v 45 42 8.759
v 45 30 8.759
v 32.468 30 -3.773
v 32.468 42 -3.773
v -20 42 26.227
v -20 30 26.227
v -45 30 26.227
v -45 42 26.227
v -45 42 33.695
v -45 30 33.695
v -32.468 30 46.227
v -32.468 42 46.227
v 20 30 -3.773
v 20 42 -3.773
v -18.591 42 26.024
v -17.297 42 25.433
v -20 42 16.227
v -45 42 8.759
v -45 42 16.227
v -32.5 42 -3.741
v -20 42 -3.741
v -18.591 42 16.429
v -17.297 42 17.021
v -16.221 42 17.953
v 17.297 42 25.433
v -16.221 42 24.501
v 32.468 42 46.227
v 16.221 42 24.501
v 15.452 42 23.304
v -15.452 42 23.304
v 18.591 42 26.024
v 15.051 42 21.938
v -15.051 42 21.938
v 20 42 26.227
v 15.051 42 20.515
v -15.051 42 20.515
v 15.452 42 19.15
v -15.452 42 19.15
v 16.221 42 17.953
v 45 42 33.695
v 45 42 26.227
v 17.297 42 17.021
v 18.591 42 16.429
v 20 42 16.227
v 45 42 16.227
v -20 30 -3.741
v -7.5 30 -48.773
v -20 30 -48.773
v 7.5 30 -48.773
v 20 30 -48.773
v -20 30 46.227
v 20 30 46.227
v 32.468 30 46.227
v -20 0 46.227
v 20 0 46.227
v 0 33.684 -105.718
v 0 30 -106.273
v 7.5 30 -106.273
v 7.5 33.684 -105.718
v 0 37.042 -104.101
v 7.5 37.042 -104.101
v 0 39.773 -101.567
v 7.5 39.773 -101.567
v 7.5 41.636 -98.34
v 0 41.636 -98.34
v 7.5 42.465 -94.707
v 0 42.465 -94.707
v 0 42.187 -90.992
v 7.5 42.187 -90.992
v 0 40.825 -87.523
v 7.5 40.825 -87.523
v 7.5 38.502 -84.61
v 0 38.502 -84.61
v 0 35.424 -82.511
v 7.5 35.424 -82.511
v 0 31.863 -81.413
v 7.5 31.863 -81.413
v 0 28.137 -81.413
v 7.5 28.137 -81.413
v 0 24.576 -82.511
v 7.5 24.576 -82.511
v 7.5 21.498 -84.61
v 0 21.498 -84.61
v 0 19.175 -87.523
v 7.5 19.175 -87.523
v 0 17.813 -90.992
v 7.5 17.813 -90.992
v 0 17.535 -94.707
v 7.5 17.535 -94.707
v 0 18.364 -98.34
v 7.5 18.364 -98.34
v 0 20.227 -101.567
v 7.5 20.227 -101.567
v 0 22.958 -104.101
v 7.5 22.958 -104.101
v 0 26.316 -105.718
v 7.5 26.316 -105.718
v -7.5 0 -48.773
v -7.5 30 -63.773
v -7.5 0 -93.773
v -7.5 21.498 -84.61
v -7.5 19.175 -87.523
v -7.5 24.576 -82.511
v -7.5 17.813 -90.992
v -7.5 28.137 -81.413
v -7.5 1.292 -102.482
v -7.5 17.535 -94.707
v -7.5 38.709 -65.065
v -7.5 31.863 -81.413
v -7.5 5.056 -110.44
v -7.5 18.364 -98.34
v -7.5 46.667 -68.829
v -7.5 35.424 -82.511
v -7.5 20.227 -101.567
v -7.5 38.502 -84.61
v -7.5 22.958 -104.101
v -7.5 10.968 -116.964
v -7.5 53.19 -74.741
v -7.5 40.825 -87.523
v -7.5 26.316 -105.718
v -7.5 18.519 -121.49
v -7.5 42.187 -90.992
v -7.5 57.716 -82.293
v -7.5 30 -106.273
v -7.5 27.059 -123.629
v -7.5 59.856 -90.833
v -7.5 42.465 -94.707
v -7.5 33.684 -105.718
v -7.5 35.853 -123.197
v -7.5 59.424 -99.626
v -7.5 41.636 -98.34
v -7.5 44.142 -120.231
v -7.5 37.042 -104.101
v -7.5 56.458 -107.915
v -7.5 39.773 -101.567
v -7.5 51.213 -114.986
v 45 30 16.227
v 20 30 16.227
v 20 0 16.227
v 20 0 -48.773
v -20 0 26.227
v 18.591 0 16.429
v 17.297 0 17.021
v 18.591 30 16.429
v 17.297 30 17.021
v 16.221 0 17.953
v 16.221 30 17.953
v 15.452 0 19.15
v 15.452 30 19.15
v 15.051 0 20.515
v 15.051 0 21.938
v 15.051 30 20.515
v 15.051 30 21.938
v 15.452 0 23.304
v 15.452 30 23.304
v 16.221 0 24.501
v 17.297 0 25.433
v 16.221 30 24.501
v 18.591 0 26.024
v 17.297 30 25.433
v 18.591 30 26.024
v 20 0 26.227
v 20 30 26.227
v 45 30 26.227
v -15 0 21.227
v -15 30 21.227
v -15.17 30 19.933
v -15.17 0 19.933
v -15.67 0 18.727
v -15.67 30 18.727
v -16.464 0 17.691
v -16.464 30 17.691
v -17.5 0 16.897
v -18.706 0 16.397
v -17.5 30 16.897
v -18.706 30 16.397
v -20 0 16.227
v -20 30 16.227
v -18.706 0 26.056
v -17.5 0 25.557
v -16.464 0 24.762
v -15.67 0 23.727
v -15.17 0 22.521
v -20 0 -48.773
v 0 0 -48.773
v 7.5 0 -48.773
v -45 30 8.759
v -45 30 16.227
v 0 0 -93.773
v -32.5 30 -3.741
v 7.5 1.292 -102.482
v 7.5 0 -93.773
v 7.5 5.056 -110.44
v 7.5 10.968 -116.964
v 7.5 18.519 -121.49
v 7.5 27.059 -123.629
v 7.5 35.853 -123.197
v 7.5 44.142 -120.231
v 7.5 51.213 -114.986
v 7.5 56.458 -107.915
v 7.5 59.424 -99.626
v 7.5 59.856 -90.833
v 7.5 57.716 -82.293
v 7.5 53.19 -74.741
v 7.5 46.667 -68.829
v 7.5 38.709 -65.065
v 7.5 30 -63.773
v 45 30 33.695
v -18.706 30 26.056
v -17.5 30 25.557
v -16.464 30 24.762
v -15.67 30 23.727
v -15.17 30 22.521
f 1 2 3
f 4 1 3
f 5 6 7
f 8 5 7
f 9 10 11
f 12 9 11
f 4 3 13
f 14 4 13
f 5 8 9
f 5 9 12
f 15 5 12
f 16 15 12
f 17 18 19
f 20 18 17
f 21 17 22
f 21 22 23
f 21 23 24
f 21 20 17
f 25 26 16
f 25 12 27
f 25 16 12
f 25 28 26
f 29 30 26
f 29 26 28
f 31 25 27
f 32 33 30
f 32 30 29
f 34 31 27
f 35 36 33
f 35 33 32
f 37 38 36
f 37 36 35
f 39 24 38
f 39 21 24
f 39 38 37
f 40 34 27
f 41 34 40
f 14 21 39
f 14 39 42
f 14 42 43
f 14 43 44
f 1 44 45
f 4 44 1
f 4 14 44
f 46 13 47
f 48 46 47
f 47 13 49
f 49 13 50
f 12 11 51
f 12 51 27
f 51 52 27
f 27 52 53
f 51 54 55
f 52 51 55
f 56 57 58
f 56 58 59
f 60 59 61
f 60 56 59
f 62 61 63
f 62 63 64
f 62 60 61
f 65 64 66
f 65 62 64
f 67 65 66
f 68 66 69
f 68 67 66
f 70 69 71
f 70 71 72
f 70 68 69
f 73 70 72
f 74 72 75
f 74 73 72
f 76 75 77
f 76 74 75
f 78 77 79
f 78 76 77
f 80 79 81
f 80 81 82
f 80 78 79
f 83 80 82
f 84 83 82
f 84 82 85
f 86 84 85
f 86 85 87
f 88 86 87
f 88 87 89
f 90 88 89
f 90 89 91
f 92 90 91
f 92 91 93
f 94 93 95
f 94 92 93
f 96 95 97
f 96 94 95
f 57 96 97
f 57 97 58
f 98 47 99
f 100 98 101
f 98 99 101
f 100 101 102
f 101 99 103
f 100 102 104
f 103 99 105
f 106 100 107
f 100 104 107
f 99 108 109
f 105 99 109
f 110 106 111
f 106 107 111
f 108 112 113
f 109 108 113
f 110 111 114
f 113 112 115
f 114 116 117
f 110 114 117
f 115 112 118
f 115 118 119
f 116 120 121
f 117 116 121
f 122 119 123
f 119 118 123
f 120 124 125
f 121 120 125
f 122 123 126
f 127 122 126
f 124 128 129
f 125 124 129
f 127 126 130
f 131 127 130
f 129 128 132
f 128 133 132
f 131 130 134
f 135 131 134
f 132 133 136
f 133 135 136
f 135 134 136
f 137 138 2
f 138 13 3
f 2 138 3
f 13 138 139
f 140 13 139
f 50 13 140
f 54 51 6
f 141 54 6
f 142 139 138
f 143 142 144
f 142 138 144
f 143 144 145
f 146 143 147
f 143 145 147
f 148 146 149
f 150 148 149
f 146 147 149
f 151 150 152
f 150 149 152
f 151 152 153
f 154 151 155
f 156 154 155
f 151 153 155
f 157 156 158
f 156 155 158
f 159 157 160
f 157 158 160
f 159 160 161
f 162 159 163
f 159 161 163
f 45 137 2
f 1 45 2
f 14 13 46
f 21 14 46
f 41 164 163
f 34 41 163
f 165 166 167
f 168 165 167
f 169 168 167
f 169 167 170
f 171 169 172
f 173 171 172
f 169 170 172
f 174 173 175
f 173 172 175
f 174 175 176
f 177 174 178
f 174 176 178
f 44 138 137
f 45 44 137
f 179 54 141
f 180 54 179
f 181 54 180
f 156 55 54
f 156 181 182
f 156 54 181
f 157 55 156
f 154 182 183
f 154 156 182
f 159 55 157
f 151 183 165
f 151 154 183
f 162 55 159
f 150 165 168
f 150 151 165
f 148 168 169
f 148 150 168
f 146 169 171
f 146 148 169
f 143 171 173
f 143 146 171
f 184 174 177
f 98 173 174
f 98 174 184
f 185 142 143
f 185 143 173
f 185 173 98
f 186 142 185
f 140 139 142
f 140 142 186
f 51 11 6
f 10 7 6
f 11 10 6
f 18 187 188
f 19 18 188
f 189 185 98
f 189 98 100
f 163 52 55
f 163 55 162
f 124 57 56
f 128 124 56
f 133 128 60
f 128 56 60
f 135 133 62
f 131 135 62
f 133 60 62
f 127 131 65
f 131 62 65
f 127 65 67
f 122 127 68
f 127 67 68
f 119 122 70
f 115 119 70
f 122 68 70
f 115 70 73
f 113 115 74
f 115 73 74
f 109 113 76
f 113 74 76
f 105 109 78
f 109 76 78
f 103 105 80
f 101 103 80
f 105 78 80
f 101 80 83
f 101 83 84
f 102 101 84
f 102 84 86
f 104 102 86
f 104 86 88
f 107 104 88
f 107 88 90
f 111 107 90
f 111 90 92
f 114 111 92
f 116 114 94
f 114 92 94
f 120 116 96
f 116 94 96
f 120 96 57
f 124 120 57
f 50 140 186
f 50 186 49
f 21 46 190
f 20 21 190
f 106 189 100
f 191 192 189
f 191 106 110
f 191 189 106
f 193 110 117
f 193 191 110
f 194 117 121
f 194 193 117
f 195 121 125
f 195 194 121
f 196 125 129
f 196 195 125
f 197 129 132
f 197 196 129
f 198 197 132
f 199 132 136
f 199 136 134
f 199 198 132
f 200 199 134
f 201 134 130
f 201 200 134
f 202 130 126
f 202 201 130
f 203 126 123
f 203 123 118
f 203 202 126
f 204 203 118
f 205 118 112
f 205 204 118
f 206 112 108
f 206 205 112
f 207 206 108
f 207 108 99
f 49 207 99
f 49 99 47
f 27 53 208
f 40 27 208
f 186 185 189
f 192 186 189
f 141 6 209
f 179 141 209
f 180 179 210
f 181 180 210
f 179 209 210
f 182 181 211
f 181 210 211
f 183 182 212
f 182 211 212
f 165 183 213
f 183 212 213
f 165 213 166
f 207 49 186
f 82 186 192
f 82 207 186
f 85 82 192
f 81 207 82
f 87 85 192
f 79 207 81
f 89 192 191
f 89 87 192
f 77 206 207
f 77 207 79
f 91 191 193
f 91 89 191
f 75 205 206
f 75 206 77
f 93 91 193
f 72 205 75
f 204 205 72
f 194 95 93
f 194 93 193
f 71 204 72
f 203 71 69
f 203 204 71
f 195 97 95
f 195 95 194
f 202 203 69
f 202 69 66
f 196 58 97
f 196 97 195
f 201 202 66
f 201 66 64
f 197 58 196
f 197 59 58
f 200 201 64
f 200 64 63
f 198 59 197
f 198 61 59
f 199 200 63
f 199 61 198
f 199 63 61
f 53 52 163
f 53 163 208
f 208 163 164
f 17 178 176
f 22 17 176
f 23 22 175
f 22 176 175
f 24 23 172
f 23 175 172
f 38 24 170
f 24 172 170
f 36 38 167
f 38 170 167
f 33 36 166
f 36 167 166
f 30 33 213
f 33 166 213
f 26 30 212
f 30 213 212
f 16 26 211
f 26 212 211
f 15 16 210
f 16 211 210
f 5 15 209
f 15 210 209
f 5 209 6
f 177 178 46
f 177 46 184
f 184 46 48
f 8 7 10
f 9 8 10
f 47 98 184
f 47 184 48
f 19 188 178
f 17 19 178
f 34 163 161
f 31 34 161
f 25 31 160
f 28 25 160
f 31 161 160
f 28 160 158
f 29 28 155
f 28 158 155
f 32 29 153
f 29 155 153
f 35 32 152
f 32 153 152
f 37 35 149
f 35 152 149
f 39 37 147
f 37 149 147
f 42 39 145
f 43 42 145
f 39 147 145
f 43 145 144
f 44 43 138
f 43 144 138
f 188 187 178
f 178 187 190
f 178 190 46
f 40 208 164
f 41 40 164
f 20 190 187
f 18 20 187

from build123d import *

# Parameters (mm, degrees)
SKETCH1_W           = 95
SKETCH1_H           = 30
BOSS_EXTRUDE1_DEPTH = 40
BOSS_EXTRUDE2_DEPTH = 12
SKETCH4_R           = 5
CUT_EXTRUDE1_DEPTH  = 87.62461911
SKETCH6_R           = 12.5
BOSS_EXTRUDE3_DEPTH = 7.5


with BuildPart() as part:
    # Sketch1 → Boss-Extrude1 (new body)
    with BuildSketch(Plane(origin=(0, 0, 0), x_dir=(0, 0, -1), z_dir=(1, 0, 0))):
        with Locations((1.273195876, 15)):
            Rectangle(SKETCH1_W, SKETCH1_H)
    extrude(amount=-BOSS_EXTRUDE1_DEPTH)

    # Sketch3 → Boss-Extrude2 (add)
    with BuildSketch(Plane(origin=(0, 30, 0), x_dir=(1, 0, 0), z_dir=(0, 1, 0))):
        with BuildLine():
            Line((12.468291965, 3.773195876), (0, 3.773195876))
            Line((0, 3.773195876), (-40, 3.741487841))
            Line((-40, 3.741487841), (-52.5, 3.741487841))
            Line((-52.5, 3.741487841), (-65, -8.758512159))
            Line((-65, -8.758512159), (-65, -16.226804124))
            Line((-65, -16.226804124), (-40, -16.226804124))
            ThreePointArc((-40, -16.226804124), (-35, -21.226804124), (-40, -26.226804124))
            Line((-40, -26.226804124), (-65, -26.226804124))
            Line((-65, -26.226804124), (-65, -33.695096088))
            Line((-65, -33.695096088), (-52.468291965, -46.226804124))
            Line((-52.468291965, -46.226804124), (12.468291965, -46.226804124))
            Line((12.468291965, -46.226804124), (25, -33.695096088))
            Line((25, -33.695096088), (25, -26.226804124))
            Line((25, -26.226804124), (0, -26.226804124))
            ThreePointArc((0, -26.226804124), (-5, -21.226804124), (0, -16.226804124))
            Line((0, -16.226804124), (25, -16.226804124))
            Line((25, -16.226804124), (25, -8.758512159))
            Line((25, -8.758512159), (12.468291965, 3.773195876))
        make_face()
    extrude(amount=BOSS_EXTRUDE2_DEPTH)

    # Sketch4 → Cut-Extrude1 (cut, through all)
    with BuildSketch(Plane(origin=(0, 30, 0), x_dir=(1, 0, 0), z_dir=(0, 1, 0))):
        with BuildLine():
            ThreePointArc((0, -16.226804124), (-5, -21.226804124), (0, -26.226804124))
            Line((0, -26.226804124), (0, -16.226804124))
        make_face()
        with Locations((-40, -21.226804124)):
            Circle(SKETCH4_R)
    extrude(amount=-CUT_EXTRUDE1_DEPTH, mode=Mode.SUBTRACT)


with BuildPart() as part_1:
    # Body-Move/Copy1: moved
    add(part.part.moved(Location((20, 0, 0))))

    # Sketch6 → Boss-Extrude3 (add, symmetric)
    with BuildSketch(Plane(origin=(0, 0, 0), x_dir=(0, 0, -1), z_dir=(1, 0, 0))):
        with BuildLine():
            Line((63.773195876, 30), (48.773195876, 30))
            Line((48.773195876, 30), (48.773195876, 0))
            Line((48.773195876, 0), (93.773195876, 0))
            ThreePointArc((93.773195876, 0), (114.986399312, 51.213203436), (63.773195876, 30))
        make_face()
        with Locations((93.773195876, 30)):
            Circle(SKETCH6_R, mode=Mode.SUBTRACT)
    extrude(amount=BOSS_EXTRUDE3_DEPTH, both=True)


solid = part_1.part
